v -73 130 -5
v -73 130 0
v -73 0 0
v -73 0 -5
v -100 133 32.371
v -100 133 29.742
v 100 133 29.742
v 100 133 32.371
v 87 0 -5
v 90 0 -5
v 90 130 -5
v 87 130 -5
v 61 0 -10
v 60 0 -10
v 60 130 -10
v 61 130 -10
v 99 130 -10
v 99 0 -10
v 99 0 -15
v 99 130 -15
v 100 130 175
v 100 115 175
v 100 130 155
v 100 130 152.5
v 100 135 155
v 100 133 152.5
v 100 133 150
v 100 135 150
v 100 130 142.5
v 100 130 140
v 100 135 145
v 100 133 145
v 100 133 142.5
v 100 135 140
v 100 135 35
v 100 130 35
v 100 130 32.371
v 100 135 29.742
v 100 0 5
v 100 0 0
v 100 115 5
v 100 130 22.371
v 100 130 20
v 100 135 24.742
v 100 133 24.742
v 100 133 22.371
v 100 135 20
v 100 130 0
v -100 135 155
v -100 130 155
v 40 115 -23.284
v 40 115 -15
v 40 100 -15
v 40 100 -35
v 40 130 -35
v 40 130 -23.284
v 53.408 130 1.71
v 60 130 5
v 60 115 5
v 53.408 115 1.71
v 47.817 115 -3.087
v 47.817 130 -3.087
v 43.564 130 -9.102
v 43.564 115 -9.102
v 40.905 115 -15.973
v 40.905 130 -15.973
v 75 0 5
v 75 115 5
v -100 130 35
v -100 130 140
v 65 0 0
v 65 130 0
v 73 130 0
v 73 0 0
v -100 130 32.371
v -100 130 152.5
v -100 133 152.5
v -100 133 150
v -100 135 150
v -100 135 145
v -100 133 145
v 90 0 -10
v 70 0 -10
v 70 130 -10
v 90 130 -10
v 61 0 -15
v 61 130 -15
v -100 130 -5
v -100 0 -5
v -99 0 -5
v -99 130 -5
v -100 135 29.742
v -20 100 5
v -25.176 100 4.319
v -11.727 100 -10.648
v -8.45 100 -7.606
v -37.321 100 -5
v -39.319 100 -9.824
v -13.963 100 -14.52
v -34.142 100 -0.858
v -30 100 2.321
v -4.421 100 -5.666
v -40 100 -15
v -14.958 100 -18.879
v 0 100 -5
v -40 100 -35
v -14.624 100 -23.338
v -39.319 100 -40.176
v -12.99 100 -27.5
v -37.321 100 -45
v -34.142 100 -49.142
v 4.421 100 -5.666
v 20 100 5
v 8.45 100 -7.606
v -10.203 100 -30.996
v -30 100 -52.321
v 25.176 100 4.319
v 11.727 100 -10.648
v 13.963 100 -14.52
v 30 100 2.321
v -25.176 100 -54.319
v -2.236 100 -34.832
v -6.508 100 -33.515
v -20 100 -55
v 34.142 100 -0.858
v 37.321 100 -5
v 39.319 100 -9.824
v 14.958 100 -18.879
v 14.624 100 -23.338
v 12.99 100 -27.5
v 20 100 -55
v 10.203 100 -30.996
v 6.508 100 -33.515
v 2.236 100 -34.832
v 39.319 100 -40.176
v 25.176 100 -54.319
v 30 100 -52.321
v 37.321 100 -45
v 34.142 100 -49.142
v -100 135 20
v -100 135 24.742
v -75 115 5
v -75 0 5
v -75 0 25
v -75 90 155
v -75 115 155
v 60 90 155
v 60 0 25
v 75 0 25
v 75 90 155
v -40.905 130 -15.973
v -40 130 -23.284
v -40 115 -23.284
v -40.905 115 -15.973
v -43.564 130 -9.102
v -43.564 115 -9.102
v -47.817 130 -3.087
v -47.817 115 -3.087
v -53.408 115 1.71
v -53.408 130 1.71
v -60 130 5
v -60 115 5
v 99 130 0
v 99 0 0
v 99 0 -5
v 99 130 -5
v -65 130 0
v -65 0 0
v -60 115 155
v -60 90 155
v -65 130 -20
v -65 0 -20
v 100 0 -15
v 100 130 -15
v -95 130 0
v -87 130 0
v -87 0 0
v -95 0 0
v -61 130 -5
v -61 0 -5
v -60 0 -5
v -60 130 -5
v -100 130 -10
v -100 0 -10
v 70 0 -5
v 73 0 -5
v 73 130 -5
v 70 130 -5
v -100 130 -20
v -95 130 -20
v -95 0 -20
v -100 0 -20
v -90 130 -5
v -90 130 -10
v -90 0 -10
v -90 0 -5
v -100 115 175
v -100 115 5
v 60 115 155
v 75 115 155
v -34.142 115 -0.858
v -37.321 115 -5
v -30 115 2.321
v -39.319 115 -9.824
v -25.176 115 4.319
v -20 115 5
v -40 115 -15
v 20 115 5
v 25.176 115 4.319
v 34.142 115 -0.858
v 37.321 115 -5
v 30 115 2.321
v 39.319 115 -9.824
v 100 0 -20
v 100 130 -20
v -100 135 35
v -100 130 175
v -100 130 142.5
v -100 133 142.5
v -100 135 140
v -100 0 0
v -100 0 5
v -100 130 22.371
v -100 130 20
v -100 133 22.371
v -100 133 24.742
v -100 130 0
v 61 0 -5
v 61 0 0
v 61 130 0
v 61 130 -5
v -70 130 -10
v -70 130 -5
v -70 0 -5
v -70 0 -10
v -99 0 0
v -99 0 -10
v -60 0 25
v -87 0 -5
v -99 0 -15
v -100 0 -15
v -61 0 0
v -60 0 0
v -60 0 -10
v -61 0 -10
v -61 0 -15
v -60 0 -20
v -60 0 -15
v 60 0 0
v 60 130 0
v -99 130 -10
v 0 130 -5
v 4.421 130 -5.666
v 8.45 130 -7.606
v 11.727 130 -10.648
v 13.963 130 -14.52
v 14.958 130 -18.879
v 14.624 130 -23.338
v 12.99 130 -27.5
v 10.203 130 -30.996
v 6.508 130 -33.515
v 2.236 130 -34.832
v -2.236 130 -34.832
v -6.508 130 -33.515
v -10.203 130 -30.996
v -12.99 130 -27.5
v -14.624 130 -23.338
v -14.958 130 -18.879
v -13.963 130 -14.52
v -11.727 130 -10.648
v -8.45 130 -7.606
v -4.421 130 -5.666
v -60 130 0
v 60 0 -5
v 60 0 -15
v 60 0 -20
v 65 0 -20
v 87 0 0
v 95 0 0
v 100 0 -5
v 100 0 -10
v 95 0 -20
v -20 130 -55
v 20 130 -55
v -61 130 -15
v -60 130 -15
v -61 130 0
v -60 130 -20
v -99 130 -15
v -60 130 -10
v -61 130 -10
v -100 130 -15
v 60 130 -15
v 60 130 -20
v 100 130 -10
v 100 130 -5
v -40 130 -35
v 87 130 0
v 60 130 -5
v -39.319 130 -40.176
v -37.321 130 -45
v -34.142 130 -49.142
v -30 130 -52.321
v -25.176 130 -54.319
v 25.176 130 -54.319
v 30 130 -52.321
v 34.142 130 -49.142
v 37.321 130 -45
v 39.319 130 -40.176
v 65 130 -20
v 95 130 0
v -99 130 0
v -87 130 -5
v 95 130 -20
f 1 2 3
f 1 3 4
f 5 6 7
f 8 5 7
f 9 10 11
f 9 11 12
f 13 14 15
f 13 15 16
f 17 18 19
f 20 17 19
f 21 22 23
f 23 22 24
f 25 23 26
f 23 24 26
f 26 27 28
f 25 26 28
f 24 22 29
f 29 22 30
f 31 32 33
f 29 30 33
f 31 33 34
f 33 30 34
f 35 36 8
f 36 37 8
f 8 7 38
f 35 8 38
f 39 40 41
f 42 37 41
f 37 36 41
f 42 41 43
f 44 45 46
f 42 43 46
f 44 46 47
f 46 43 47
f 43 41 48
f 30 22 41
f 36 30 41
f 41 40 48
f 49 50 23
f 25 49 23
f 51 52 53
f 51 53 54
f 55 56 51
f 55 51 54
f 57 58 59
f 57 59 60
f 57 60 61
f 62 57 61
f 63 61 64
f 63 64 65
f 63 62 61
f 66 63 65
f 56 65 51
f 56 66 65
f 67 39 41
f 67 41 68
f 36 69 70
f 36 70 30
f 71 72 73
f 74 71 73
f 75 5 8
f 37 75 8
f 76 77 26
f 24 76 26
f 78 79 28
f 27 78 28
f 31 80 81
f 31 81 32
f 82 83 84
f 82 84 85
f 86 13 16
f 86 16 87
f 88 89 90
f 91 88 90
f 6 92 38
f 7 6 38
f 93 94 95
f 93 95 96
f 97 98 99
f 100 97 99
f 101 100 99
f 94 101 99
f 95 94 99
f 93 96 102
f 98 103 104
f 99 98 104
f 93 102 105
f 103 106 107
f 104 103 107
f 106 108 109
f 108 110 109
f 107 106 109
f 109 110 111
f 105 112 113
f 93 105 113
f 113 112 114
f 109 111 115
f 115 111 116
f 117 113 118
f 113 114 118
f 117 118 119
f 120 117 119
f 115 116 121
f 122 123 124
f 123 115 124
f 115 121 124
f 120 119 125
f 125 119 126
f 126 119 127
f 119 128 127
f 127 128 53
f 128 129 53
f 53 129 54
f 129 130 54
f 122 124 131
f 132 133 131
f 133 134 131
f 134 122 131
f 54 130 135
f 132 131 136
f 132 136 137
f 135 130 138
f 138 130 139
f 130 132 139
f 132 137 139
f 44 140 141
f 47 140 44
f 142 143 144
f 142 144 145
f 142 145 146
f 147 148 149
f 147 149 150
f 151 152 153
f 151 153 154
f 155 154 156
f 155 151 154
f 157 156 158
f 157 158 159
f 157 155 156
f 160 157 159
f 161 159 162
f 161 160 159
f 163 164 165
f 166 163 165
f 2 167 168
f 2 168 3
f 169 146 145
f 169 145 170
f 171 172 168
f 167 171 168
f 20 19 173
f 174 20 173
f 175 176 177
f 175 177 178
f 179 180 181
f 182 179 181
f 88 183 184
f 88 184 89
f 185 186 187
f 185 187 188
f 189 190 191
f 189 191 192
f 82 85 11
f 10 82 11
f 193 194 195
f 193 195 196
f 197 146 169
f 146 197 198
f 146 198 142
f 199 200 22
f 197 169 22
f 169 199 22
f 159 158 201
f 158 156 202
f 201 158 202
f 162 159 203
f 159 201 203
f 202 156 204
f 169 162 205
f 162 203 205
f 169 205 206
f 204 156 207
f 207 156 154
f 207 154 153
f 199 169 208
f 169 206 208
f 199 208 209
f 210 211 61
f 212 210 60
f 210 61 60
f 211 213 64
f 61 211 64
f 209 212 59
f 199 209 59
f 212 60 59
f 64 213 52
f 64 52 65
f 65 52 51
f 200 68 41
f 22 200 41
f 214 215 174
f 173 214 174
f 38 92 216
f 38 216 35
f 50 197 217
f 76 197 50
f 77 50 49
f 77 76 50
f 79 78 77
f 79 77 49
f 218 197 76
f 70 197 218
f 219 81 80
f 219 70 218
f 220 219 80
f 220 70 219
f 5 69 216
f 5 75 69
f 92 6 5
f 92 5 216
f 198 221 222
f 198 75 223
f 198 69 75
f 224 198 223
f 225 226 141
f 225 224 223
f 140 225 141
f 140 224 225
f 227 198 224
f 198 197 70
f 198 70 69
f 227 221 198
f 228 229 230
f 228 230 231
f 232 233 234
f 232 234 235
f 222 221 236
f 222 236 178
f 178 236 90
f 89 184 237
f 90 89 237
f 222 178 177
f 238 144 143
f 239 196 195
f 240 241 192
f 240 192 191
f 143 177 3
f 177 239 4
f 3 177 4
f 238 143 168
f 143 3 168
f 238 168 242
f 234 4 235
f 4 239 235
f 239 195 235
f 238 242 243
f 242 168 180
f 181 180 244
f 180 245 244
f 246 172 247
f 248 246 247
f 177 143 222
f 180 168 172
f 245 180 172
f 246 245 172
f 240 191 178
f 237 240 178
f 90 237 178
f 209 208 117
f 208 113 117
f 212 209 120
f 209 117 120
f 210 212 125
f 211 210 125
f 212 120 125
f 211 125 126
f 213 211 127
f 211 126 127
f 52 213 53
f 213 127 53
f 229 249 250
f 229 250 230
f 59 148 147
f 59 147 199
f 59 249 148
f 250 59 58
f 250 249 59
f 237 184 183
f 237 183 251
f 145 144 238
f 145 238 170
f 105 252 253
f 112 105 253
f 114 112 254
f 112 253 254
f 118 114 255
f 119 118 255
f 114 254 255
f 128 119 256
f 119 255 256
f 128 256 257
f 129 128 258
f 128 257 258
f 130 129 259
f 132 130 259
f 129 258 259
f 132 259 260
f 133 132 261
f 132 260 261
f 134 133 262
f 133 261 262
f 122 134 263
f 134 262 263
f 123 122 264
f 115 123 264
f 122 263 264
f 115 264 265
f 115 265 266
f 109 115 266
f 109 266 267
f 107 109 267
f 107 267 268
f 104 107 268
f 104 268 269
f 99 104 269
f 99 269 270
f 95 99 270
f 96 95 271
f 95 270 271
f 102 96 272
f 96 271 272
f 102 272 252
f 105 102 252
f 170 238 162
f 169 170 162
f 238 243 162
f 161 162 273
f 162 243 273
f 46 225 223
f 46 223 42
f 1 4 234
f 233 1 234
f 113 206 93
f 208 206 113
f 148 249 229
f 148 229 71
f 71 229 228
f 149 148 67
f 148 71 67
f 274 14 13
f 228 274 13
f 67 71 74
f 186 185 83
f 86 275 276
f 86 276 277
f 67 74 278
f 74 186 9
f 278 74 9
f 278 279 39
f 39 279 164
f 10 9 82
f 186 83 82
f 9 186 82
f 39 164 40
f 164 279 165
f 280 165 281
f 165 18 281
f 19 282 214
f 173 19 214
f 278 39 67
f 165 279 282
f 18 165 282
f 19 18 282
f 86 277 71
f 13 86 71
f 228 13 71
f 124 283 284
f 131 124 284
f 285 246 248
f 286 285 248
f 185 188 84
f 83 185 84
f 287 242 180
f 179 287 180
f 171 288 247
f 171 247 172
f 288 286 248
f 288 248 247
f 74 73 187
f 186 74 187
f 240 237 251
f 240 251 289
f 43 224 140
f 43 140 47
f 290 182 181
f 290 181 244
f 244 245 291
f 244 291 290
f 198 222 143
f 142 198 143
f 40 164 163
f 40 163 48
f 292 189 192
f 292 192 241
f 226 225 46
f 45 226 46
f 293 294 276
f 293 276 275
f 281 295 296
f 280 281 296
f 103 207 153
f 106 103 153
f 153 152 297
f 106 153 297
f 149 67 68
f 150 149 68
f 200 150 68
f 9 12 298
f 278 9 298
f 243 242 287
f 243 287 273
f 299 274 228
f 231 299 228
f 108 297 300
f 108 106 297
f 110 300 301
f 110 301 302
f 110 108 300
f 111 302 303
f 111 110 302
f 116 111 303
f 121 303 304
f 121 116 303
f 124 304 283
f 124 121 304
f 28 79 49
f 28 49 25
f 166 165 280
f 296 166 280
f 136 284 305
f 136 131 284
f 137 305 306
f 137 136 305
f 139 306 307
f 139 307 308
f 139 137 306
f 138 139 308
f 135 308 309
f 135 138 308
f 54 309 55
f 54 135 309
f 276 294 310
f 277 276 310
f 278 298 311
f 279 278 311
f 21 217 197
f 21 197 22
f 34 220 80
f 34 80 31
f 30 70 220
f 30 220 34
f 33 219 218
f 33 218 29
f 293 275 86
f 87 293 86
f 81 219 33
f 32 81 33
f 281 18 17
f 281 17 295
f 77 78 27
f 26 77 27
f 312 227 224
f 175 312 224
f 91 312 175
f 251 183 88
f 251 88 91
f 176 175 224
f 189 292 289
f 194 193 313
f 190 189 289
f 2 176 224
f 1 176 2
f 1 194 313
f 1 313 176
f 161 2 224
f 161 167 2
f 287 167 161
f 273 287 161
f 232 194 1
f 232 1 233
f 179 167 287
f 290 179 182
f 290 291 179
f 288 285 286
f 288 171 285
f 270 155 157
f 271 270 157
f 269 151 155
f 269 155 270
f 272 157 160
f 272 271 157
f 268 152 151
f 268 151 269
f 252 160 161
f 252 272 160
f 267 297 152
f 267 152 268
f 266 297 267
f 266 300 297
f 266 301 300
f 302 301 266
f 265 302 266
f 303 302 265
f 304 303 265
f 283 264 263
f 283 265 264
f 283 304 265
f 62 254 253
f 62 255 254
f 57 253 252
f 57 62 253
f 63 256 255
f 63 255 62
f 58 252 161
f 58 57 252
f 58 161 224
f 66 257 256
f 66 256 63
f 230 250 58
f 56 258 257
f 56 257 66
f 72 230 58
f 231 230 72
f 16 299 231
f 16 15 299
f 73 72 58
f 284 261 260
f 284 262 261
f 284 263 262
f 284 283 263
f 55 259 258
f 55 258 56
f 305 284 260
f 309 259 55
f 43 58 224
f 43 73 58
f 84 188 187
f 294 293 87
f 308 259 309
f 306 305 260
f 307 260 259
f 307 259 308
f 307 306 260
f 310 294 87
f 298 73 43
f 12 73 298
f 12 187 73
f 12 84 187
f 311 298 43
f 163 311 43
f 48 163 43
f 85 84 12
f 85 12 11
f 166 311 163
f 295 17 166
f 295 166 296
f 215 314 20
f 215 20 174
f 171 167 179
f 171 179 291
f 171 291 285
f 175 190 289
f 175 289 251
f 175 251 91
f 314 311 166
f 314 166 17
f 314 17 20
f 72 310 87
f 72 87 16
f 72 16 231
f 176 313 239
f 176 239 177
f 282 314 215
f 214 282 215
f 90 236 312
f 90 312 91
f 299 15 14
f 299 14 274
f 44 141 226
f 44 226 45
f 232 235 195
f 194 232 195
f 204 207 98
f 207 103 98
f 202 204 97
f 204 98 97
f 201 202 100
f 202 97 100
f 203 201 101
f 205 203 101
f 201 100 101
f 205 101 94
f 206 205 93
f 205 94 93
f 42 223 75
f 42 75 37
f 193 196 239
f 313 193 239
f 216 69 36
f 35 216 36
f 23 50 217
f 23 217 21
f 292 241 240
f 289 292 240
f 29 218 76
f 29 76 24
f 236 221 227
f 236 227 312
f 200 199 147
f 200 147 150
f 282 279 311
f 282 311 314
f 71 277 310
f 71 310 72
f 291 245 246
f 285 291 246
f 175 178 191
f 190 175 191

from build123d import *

# Parameters (mm, degrees)
EXTRUDE_1_DEPTH     = 130
EXTRUDE_1_2_DEPTH   = 130
SKETCH_3_W          = 1
SKETCH_3_H          = 5
CUT_EXTRUDE_3_DEPTH = 166.227116419
SKETCH_5_W          = 200
SKETCH_5_H          = 15
EXTRUDE_2_DEPTH     = 170
SKETCH_6_W          = 15
SKETCH_6_H          = 115
EXTRUDE_3_DEPTH     = 150
CUT_EXTRUDE_4_DEPTH = 280.55321497
SKETCH_8_W          = 80
SKETCH_8_H          = 60
SKETCH_8_R          = 15
EXTRUDE_4_DEPTH     = 30
FILLET_1_R          = 30
FILLET_3_R          = 20
SKETCH_9_W          = 200
SKETCH_9_H          = 15
EXTRUDE_5_DEPTH     = 5
SKETCH_10_W         = 200
SKETCH_10_H         = 5
CUT_EXTRUDE_5_DEPTH = 2
SKETCH_11_W         = 200
SKETCH_11_H         = 10
CUT_EXTRUDE_6_DEPTH = 3


with BuildPart() as part:
    # 草图1 → 凸台-拉伸1 (new body)
    with BuildSketch(Plane(origin=(0, 0, 0), x_dir=(1, 0, 0), z_dir=(0, 1, 0))):
        Polygon((-60, 0), (-60, 20), (-65, 20), (-65, 0), (-73, 0), (-73, 5), (-70, 5), (-70, 10), (-90, 10), (-90, 5), (-87, 5), (-87, 0), (-95, 0), (-95, 20), (-100, 20), (-100, -5), (-60, -5), align=None)
    extrude(amount=EXTRUDE_1_DEPTH)


with BuildPart() as body_2:
    # 草图1 → Extrude 1 2 (new body)
    with BuildSketch(Plane(origin=(0, 0, 0), x_dir=(1, 0, 0), z_dir=(0, 1, 0))):
        Polygon((73, 0), (73, 5), (70, 5), (70, 10), (90, 10), (90, 5), (87, 5), (87, 0), (95, 0), (95, 20), (100, 20), (100, -5), (60, -5), (60, 0), (60, 20), (65, 20), (65, 0), align=None)
    extrude(amount=EXTRUDE_1_2_DEPTH)


with BuildPart() as cut_extrude_3_tool:
    # 草图3 → 切除-拉伸3 (new, through all)
    with BuildSketch(Plane(origin=(0, 130, 0), x_dir=(1, 0, 0), z_dir=(0, 1, 0))):
        with Locations((-99.5, 12.5)):
            Rectangle(SKETCH_3_W, SKETCH_3_H)
        with Locations((-99.5, 2.5)):
            Rectangle(SKETCH_3_W, SKETCH_3_H)
        with Locations((-60.5, 12.5)):
            Rectangle(SKETCH_3_W, SKETCH_3_H)
        with Locations((-60.5, 2.5)):
            Rectangle(SKETCH_3_W, SKETCH_3_H)
        with Locations((60.5, 2.5)):
            Rectangle(SKETCH_3_W, SKETCH_3_H)
        with Locations((60.5, 12.5)):
            Rectangle(SKETCH_3_W, SKETCH_3_H)
        with Locations((99.5, 2.5)):
            Rectangle(SKETCH_3_W, SKETCH_3_H)
        with Locations((99.5, 12.5)):
            Rectangle(SKETCH_3_W, SKETCH_3_H)
    extrude(amount=-CUT_EXTRUDE_3_DEPTH)


with BuildPart() as part_1:
    add(part.part)

    # 切除-拉伸3: cut by cut_extrude_3_tool
    add(cut_extrude_3_tool.part, mode=Mode.SUBTRACT)



with BuildPart() as body_2_1:
    add(body_2.part)

    # 切除-拉伸3: cut by cut_extrude_3_tool
    add(cut_extrude_3_tool.part, mode=Mode.SUBTRACT)


with BuildPart() as part_2:
    add(part_1.part)

    add(body_2_1.part)  # 凸台-拉伸2 merges body 2
    # 草图5 → 凸台-拉伸2 (add)
    with BuildSketch(Plane.XY.offset(5)):
        with Locations((0, 122.5)):
            Rectangle(SKETCH_5_W, SKETCH_5_H)
    extrude(amount=EXTRUDE_2_DEPTH)

    # 草图6 → 凸台-拉伸3 (add)
    with BuildSketch(Plane.XY.offset(5)):
        with Locations((-67.5, 57.5)):
            Rectangle(SKETCH_6_W, SKETCH_6_H)
        with Locations((67.5, 57.5)):
            Rectangle(SKETCH_6_W, SKETCH_6_H)
    extrude(amount=EXTRUDE_3_DEPTH)

    # 草图7 → 切除-拉伸4 (cut, through all)
    with BuildSketch(Plane.ZY.offset(75)):
        Polygon((25, 0), (155, 90), (155, 0), align=None)
    extrude(amount=-CUT_EXTRUDE_4_DEPTH, mode=Mode.SUBTRACT)

    # 草图8 → 凸台-拉伸4 (add)
    with BuildSketch(Plane(origin=(0, 130, 0), x_dir=(1, 0, 0), z_dir=(0, 1, 0))):
        with Locations((0, 25)):
            Rectangle(SKETCH_8_W, SKETCH_8_H)
        with Locations(Location((0, 20, 0), (0, 0, 270))):
            Circle(SKETCH_8_R, mode=Mode.SUBTRACT)
    extrude(amount=-EXTRUDE_4_DEPTH)

    # 圆角1
    # the kernel refuses this fillet: 30 mm, written as the material it adds along each edge
    with BuildSketch(Plane(origin=(40, 130, 5), x_dir=(1, 0, 0), z_dir=(0, -1, 0))) as fillet_1_piece_1:
        with BuildLine():
            CenterArc((30, -28.284271247), FILLET_1_R, 109.471220634, 70.528779366)
            Line((0, -28.284271247), (0, 0))
            Line((0, 0), (20, 0))
        make_face()
    extrude(amount=15)
    with BuildSketch(Plane(origin=(-40, 130, 5), x_dir=(-1, 0, 0), z_dir=(0, -1, 0))) as fillet_1_piece_2:
        with BuildLine():
            CenterArc((30, 28.284271247), FILLET_1_R, 180, 70.528779366)
            Line((0, 28.284271247), (0, 0))
            Line((0, 0), (20, 0))
        make_face()
    extrude(amount=15)

    # 圆角3
    fillet_3_edges = [part_2.edges().sort_by_distance(p)[0] for p in [
        (40, 107.5, 5),
        (-40, 107.5, 5),
        (-40, 115, -55),
        (40, 115, -55),
    ]]
    fillet(fillet_3_edges, radius=FILLET_3_R)

    # 草图9 → 凸台-拉伸5 (add)
    with BuildSketch(Plane(origin=(0, 130, 0), x_dir=(1, 0, 0), z_dir=(0, 1, 0))):
        with Locations((0, -147.5)):
            Rectangle(SKETCH_9_W, SKETCH_9_H)
        with Locations((0, -27.5)):
            Rectangle(SKETCH_9_W, SKETCH_9_H)
    extrude(amount=EXTRUDE_5_DEPTH)

    # 草图10 → 切除-拉伸5 (cut)
    with BuildSketch(Plane(origin=(0, 135, 0), x_dir=(1, 0, 0), z_dir=(0, 1, 0))):
        with Locations((0, -27.241970949)):
            Rectangle(SKETCH_10_W, SKETCH_10_H)
        with Locations((0, -147.5)):
            Rectangle(SKETCH_10_W, SKETCH_10_H)
    extrude(amount=-CUT_EXTRUDE_5_DEPTH, mode=Mode.SUBTRACT)

    # 草图11 → 切除-拉伸6 (cut)
    with BuildSketch(Plane(origin=(0, 133, 0), x_dir=(1, 0, 0), z_dir=(0, 1, 0))):
        with Locations((0, -27.370985475)):
            Rectangle(SKETCH_11_W, SKETCH_11_H)
        with Locations((0, -147.5)):
            Rectangle(SKETCH_11_W, SKETCH_11_H)
    extrude(amount=-CUT_EXTRUDE_6_DEPTH, mode=Mode.SUBTRACT)


solid = part_2.part
